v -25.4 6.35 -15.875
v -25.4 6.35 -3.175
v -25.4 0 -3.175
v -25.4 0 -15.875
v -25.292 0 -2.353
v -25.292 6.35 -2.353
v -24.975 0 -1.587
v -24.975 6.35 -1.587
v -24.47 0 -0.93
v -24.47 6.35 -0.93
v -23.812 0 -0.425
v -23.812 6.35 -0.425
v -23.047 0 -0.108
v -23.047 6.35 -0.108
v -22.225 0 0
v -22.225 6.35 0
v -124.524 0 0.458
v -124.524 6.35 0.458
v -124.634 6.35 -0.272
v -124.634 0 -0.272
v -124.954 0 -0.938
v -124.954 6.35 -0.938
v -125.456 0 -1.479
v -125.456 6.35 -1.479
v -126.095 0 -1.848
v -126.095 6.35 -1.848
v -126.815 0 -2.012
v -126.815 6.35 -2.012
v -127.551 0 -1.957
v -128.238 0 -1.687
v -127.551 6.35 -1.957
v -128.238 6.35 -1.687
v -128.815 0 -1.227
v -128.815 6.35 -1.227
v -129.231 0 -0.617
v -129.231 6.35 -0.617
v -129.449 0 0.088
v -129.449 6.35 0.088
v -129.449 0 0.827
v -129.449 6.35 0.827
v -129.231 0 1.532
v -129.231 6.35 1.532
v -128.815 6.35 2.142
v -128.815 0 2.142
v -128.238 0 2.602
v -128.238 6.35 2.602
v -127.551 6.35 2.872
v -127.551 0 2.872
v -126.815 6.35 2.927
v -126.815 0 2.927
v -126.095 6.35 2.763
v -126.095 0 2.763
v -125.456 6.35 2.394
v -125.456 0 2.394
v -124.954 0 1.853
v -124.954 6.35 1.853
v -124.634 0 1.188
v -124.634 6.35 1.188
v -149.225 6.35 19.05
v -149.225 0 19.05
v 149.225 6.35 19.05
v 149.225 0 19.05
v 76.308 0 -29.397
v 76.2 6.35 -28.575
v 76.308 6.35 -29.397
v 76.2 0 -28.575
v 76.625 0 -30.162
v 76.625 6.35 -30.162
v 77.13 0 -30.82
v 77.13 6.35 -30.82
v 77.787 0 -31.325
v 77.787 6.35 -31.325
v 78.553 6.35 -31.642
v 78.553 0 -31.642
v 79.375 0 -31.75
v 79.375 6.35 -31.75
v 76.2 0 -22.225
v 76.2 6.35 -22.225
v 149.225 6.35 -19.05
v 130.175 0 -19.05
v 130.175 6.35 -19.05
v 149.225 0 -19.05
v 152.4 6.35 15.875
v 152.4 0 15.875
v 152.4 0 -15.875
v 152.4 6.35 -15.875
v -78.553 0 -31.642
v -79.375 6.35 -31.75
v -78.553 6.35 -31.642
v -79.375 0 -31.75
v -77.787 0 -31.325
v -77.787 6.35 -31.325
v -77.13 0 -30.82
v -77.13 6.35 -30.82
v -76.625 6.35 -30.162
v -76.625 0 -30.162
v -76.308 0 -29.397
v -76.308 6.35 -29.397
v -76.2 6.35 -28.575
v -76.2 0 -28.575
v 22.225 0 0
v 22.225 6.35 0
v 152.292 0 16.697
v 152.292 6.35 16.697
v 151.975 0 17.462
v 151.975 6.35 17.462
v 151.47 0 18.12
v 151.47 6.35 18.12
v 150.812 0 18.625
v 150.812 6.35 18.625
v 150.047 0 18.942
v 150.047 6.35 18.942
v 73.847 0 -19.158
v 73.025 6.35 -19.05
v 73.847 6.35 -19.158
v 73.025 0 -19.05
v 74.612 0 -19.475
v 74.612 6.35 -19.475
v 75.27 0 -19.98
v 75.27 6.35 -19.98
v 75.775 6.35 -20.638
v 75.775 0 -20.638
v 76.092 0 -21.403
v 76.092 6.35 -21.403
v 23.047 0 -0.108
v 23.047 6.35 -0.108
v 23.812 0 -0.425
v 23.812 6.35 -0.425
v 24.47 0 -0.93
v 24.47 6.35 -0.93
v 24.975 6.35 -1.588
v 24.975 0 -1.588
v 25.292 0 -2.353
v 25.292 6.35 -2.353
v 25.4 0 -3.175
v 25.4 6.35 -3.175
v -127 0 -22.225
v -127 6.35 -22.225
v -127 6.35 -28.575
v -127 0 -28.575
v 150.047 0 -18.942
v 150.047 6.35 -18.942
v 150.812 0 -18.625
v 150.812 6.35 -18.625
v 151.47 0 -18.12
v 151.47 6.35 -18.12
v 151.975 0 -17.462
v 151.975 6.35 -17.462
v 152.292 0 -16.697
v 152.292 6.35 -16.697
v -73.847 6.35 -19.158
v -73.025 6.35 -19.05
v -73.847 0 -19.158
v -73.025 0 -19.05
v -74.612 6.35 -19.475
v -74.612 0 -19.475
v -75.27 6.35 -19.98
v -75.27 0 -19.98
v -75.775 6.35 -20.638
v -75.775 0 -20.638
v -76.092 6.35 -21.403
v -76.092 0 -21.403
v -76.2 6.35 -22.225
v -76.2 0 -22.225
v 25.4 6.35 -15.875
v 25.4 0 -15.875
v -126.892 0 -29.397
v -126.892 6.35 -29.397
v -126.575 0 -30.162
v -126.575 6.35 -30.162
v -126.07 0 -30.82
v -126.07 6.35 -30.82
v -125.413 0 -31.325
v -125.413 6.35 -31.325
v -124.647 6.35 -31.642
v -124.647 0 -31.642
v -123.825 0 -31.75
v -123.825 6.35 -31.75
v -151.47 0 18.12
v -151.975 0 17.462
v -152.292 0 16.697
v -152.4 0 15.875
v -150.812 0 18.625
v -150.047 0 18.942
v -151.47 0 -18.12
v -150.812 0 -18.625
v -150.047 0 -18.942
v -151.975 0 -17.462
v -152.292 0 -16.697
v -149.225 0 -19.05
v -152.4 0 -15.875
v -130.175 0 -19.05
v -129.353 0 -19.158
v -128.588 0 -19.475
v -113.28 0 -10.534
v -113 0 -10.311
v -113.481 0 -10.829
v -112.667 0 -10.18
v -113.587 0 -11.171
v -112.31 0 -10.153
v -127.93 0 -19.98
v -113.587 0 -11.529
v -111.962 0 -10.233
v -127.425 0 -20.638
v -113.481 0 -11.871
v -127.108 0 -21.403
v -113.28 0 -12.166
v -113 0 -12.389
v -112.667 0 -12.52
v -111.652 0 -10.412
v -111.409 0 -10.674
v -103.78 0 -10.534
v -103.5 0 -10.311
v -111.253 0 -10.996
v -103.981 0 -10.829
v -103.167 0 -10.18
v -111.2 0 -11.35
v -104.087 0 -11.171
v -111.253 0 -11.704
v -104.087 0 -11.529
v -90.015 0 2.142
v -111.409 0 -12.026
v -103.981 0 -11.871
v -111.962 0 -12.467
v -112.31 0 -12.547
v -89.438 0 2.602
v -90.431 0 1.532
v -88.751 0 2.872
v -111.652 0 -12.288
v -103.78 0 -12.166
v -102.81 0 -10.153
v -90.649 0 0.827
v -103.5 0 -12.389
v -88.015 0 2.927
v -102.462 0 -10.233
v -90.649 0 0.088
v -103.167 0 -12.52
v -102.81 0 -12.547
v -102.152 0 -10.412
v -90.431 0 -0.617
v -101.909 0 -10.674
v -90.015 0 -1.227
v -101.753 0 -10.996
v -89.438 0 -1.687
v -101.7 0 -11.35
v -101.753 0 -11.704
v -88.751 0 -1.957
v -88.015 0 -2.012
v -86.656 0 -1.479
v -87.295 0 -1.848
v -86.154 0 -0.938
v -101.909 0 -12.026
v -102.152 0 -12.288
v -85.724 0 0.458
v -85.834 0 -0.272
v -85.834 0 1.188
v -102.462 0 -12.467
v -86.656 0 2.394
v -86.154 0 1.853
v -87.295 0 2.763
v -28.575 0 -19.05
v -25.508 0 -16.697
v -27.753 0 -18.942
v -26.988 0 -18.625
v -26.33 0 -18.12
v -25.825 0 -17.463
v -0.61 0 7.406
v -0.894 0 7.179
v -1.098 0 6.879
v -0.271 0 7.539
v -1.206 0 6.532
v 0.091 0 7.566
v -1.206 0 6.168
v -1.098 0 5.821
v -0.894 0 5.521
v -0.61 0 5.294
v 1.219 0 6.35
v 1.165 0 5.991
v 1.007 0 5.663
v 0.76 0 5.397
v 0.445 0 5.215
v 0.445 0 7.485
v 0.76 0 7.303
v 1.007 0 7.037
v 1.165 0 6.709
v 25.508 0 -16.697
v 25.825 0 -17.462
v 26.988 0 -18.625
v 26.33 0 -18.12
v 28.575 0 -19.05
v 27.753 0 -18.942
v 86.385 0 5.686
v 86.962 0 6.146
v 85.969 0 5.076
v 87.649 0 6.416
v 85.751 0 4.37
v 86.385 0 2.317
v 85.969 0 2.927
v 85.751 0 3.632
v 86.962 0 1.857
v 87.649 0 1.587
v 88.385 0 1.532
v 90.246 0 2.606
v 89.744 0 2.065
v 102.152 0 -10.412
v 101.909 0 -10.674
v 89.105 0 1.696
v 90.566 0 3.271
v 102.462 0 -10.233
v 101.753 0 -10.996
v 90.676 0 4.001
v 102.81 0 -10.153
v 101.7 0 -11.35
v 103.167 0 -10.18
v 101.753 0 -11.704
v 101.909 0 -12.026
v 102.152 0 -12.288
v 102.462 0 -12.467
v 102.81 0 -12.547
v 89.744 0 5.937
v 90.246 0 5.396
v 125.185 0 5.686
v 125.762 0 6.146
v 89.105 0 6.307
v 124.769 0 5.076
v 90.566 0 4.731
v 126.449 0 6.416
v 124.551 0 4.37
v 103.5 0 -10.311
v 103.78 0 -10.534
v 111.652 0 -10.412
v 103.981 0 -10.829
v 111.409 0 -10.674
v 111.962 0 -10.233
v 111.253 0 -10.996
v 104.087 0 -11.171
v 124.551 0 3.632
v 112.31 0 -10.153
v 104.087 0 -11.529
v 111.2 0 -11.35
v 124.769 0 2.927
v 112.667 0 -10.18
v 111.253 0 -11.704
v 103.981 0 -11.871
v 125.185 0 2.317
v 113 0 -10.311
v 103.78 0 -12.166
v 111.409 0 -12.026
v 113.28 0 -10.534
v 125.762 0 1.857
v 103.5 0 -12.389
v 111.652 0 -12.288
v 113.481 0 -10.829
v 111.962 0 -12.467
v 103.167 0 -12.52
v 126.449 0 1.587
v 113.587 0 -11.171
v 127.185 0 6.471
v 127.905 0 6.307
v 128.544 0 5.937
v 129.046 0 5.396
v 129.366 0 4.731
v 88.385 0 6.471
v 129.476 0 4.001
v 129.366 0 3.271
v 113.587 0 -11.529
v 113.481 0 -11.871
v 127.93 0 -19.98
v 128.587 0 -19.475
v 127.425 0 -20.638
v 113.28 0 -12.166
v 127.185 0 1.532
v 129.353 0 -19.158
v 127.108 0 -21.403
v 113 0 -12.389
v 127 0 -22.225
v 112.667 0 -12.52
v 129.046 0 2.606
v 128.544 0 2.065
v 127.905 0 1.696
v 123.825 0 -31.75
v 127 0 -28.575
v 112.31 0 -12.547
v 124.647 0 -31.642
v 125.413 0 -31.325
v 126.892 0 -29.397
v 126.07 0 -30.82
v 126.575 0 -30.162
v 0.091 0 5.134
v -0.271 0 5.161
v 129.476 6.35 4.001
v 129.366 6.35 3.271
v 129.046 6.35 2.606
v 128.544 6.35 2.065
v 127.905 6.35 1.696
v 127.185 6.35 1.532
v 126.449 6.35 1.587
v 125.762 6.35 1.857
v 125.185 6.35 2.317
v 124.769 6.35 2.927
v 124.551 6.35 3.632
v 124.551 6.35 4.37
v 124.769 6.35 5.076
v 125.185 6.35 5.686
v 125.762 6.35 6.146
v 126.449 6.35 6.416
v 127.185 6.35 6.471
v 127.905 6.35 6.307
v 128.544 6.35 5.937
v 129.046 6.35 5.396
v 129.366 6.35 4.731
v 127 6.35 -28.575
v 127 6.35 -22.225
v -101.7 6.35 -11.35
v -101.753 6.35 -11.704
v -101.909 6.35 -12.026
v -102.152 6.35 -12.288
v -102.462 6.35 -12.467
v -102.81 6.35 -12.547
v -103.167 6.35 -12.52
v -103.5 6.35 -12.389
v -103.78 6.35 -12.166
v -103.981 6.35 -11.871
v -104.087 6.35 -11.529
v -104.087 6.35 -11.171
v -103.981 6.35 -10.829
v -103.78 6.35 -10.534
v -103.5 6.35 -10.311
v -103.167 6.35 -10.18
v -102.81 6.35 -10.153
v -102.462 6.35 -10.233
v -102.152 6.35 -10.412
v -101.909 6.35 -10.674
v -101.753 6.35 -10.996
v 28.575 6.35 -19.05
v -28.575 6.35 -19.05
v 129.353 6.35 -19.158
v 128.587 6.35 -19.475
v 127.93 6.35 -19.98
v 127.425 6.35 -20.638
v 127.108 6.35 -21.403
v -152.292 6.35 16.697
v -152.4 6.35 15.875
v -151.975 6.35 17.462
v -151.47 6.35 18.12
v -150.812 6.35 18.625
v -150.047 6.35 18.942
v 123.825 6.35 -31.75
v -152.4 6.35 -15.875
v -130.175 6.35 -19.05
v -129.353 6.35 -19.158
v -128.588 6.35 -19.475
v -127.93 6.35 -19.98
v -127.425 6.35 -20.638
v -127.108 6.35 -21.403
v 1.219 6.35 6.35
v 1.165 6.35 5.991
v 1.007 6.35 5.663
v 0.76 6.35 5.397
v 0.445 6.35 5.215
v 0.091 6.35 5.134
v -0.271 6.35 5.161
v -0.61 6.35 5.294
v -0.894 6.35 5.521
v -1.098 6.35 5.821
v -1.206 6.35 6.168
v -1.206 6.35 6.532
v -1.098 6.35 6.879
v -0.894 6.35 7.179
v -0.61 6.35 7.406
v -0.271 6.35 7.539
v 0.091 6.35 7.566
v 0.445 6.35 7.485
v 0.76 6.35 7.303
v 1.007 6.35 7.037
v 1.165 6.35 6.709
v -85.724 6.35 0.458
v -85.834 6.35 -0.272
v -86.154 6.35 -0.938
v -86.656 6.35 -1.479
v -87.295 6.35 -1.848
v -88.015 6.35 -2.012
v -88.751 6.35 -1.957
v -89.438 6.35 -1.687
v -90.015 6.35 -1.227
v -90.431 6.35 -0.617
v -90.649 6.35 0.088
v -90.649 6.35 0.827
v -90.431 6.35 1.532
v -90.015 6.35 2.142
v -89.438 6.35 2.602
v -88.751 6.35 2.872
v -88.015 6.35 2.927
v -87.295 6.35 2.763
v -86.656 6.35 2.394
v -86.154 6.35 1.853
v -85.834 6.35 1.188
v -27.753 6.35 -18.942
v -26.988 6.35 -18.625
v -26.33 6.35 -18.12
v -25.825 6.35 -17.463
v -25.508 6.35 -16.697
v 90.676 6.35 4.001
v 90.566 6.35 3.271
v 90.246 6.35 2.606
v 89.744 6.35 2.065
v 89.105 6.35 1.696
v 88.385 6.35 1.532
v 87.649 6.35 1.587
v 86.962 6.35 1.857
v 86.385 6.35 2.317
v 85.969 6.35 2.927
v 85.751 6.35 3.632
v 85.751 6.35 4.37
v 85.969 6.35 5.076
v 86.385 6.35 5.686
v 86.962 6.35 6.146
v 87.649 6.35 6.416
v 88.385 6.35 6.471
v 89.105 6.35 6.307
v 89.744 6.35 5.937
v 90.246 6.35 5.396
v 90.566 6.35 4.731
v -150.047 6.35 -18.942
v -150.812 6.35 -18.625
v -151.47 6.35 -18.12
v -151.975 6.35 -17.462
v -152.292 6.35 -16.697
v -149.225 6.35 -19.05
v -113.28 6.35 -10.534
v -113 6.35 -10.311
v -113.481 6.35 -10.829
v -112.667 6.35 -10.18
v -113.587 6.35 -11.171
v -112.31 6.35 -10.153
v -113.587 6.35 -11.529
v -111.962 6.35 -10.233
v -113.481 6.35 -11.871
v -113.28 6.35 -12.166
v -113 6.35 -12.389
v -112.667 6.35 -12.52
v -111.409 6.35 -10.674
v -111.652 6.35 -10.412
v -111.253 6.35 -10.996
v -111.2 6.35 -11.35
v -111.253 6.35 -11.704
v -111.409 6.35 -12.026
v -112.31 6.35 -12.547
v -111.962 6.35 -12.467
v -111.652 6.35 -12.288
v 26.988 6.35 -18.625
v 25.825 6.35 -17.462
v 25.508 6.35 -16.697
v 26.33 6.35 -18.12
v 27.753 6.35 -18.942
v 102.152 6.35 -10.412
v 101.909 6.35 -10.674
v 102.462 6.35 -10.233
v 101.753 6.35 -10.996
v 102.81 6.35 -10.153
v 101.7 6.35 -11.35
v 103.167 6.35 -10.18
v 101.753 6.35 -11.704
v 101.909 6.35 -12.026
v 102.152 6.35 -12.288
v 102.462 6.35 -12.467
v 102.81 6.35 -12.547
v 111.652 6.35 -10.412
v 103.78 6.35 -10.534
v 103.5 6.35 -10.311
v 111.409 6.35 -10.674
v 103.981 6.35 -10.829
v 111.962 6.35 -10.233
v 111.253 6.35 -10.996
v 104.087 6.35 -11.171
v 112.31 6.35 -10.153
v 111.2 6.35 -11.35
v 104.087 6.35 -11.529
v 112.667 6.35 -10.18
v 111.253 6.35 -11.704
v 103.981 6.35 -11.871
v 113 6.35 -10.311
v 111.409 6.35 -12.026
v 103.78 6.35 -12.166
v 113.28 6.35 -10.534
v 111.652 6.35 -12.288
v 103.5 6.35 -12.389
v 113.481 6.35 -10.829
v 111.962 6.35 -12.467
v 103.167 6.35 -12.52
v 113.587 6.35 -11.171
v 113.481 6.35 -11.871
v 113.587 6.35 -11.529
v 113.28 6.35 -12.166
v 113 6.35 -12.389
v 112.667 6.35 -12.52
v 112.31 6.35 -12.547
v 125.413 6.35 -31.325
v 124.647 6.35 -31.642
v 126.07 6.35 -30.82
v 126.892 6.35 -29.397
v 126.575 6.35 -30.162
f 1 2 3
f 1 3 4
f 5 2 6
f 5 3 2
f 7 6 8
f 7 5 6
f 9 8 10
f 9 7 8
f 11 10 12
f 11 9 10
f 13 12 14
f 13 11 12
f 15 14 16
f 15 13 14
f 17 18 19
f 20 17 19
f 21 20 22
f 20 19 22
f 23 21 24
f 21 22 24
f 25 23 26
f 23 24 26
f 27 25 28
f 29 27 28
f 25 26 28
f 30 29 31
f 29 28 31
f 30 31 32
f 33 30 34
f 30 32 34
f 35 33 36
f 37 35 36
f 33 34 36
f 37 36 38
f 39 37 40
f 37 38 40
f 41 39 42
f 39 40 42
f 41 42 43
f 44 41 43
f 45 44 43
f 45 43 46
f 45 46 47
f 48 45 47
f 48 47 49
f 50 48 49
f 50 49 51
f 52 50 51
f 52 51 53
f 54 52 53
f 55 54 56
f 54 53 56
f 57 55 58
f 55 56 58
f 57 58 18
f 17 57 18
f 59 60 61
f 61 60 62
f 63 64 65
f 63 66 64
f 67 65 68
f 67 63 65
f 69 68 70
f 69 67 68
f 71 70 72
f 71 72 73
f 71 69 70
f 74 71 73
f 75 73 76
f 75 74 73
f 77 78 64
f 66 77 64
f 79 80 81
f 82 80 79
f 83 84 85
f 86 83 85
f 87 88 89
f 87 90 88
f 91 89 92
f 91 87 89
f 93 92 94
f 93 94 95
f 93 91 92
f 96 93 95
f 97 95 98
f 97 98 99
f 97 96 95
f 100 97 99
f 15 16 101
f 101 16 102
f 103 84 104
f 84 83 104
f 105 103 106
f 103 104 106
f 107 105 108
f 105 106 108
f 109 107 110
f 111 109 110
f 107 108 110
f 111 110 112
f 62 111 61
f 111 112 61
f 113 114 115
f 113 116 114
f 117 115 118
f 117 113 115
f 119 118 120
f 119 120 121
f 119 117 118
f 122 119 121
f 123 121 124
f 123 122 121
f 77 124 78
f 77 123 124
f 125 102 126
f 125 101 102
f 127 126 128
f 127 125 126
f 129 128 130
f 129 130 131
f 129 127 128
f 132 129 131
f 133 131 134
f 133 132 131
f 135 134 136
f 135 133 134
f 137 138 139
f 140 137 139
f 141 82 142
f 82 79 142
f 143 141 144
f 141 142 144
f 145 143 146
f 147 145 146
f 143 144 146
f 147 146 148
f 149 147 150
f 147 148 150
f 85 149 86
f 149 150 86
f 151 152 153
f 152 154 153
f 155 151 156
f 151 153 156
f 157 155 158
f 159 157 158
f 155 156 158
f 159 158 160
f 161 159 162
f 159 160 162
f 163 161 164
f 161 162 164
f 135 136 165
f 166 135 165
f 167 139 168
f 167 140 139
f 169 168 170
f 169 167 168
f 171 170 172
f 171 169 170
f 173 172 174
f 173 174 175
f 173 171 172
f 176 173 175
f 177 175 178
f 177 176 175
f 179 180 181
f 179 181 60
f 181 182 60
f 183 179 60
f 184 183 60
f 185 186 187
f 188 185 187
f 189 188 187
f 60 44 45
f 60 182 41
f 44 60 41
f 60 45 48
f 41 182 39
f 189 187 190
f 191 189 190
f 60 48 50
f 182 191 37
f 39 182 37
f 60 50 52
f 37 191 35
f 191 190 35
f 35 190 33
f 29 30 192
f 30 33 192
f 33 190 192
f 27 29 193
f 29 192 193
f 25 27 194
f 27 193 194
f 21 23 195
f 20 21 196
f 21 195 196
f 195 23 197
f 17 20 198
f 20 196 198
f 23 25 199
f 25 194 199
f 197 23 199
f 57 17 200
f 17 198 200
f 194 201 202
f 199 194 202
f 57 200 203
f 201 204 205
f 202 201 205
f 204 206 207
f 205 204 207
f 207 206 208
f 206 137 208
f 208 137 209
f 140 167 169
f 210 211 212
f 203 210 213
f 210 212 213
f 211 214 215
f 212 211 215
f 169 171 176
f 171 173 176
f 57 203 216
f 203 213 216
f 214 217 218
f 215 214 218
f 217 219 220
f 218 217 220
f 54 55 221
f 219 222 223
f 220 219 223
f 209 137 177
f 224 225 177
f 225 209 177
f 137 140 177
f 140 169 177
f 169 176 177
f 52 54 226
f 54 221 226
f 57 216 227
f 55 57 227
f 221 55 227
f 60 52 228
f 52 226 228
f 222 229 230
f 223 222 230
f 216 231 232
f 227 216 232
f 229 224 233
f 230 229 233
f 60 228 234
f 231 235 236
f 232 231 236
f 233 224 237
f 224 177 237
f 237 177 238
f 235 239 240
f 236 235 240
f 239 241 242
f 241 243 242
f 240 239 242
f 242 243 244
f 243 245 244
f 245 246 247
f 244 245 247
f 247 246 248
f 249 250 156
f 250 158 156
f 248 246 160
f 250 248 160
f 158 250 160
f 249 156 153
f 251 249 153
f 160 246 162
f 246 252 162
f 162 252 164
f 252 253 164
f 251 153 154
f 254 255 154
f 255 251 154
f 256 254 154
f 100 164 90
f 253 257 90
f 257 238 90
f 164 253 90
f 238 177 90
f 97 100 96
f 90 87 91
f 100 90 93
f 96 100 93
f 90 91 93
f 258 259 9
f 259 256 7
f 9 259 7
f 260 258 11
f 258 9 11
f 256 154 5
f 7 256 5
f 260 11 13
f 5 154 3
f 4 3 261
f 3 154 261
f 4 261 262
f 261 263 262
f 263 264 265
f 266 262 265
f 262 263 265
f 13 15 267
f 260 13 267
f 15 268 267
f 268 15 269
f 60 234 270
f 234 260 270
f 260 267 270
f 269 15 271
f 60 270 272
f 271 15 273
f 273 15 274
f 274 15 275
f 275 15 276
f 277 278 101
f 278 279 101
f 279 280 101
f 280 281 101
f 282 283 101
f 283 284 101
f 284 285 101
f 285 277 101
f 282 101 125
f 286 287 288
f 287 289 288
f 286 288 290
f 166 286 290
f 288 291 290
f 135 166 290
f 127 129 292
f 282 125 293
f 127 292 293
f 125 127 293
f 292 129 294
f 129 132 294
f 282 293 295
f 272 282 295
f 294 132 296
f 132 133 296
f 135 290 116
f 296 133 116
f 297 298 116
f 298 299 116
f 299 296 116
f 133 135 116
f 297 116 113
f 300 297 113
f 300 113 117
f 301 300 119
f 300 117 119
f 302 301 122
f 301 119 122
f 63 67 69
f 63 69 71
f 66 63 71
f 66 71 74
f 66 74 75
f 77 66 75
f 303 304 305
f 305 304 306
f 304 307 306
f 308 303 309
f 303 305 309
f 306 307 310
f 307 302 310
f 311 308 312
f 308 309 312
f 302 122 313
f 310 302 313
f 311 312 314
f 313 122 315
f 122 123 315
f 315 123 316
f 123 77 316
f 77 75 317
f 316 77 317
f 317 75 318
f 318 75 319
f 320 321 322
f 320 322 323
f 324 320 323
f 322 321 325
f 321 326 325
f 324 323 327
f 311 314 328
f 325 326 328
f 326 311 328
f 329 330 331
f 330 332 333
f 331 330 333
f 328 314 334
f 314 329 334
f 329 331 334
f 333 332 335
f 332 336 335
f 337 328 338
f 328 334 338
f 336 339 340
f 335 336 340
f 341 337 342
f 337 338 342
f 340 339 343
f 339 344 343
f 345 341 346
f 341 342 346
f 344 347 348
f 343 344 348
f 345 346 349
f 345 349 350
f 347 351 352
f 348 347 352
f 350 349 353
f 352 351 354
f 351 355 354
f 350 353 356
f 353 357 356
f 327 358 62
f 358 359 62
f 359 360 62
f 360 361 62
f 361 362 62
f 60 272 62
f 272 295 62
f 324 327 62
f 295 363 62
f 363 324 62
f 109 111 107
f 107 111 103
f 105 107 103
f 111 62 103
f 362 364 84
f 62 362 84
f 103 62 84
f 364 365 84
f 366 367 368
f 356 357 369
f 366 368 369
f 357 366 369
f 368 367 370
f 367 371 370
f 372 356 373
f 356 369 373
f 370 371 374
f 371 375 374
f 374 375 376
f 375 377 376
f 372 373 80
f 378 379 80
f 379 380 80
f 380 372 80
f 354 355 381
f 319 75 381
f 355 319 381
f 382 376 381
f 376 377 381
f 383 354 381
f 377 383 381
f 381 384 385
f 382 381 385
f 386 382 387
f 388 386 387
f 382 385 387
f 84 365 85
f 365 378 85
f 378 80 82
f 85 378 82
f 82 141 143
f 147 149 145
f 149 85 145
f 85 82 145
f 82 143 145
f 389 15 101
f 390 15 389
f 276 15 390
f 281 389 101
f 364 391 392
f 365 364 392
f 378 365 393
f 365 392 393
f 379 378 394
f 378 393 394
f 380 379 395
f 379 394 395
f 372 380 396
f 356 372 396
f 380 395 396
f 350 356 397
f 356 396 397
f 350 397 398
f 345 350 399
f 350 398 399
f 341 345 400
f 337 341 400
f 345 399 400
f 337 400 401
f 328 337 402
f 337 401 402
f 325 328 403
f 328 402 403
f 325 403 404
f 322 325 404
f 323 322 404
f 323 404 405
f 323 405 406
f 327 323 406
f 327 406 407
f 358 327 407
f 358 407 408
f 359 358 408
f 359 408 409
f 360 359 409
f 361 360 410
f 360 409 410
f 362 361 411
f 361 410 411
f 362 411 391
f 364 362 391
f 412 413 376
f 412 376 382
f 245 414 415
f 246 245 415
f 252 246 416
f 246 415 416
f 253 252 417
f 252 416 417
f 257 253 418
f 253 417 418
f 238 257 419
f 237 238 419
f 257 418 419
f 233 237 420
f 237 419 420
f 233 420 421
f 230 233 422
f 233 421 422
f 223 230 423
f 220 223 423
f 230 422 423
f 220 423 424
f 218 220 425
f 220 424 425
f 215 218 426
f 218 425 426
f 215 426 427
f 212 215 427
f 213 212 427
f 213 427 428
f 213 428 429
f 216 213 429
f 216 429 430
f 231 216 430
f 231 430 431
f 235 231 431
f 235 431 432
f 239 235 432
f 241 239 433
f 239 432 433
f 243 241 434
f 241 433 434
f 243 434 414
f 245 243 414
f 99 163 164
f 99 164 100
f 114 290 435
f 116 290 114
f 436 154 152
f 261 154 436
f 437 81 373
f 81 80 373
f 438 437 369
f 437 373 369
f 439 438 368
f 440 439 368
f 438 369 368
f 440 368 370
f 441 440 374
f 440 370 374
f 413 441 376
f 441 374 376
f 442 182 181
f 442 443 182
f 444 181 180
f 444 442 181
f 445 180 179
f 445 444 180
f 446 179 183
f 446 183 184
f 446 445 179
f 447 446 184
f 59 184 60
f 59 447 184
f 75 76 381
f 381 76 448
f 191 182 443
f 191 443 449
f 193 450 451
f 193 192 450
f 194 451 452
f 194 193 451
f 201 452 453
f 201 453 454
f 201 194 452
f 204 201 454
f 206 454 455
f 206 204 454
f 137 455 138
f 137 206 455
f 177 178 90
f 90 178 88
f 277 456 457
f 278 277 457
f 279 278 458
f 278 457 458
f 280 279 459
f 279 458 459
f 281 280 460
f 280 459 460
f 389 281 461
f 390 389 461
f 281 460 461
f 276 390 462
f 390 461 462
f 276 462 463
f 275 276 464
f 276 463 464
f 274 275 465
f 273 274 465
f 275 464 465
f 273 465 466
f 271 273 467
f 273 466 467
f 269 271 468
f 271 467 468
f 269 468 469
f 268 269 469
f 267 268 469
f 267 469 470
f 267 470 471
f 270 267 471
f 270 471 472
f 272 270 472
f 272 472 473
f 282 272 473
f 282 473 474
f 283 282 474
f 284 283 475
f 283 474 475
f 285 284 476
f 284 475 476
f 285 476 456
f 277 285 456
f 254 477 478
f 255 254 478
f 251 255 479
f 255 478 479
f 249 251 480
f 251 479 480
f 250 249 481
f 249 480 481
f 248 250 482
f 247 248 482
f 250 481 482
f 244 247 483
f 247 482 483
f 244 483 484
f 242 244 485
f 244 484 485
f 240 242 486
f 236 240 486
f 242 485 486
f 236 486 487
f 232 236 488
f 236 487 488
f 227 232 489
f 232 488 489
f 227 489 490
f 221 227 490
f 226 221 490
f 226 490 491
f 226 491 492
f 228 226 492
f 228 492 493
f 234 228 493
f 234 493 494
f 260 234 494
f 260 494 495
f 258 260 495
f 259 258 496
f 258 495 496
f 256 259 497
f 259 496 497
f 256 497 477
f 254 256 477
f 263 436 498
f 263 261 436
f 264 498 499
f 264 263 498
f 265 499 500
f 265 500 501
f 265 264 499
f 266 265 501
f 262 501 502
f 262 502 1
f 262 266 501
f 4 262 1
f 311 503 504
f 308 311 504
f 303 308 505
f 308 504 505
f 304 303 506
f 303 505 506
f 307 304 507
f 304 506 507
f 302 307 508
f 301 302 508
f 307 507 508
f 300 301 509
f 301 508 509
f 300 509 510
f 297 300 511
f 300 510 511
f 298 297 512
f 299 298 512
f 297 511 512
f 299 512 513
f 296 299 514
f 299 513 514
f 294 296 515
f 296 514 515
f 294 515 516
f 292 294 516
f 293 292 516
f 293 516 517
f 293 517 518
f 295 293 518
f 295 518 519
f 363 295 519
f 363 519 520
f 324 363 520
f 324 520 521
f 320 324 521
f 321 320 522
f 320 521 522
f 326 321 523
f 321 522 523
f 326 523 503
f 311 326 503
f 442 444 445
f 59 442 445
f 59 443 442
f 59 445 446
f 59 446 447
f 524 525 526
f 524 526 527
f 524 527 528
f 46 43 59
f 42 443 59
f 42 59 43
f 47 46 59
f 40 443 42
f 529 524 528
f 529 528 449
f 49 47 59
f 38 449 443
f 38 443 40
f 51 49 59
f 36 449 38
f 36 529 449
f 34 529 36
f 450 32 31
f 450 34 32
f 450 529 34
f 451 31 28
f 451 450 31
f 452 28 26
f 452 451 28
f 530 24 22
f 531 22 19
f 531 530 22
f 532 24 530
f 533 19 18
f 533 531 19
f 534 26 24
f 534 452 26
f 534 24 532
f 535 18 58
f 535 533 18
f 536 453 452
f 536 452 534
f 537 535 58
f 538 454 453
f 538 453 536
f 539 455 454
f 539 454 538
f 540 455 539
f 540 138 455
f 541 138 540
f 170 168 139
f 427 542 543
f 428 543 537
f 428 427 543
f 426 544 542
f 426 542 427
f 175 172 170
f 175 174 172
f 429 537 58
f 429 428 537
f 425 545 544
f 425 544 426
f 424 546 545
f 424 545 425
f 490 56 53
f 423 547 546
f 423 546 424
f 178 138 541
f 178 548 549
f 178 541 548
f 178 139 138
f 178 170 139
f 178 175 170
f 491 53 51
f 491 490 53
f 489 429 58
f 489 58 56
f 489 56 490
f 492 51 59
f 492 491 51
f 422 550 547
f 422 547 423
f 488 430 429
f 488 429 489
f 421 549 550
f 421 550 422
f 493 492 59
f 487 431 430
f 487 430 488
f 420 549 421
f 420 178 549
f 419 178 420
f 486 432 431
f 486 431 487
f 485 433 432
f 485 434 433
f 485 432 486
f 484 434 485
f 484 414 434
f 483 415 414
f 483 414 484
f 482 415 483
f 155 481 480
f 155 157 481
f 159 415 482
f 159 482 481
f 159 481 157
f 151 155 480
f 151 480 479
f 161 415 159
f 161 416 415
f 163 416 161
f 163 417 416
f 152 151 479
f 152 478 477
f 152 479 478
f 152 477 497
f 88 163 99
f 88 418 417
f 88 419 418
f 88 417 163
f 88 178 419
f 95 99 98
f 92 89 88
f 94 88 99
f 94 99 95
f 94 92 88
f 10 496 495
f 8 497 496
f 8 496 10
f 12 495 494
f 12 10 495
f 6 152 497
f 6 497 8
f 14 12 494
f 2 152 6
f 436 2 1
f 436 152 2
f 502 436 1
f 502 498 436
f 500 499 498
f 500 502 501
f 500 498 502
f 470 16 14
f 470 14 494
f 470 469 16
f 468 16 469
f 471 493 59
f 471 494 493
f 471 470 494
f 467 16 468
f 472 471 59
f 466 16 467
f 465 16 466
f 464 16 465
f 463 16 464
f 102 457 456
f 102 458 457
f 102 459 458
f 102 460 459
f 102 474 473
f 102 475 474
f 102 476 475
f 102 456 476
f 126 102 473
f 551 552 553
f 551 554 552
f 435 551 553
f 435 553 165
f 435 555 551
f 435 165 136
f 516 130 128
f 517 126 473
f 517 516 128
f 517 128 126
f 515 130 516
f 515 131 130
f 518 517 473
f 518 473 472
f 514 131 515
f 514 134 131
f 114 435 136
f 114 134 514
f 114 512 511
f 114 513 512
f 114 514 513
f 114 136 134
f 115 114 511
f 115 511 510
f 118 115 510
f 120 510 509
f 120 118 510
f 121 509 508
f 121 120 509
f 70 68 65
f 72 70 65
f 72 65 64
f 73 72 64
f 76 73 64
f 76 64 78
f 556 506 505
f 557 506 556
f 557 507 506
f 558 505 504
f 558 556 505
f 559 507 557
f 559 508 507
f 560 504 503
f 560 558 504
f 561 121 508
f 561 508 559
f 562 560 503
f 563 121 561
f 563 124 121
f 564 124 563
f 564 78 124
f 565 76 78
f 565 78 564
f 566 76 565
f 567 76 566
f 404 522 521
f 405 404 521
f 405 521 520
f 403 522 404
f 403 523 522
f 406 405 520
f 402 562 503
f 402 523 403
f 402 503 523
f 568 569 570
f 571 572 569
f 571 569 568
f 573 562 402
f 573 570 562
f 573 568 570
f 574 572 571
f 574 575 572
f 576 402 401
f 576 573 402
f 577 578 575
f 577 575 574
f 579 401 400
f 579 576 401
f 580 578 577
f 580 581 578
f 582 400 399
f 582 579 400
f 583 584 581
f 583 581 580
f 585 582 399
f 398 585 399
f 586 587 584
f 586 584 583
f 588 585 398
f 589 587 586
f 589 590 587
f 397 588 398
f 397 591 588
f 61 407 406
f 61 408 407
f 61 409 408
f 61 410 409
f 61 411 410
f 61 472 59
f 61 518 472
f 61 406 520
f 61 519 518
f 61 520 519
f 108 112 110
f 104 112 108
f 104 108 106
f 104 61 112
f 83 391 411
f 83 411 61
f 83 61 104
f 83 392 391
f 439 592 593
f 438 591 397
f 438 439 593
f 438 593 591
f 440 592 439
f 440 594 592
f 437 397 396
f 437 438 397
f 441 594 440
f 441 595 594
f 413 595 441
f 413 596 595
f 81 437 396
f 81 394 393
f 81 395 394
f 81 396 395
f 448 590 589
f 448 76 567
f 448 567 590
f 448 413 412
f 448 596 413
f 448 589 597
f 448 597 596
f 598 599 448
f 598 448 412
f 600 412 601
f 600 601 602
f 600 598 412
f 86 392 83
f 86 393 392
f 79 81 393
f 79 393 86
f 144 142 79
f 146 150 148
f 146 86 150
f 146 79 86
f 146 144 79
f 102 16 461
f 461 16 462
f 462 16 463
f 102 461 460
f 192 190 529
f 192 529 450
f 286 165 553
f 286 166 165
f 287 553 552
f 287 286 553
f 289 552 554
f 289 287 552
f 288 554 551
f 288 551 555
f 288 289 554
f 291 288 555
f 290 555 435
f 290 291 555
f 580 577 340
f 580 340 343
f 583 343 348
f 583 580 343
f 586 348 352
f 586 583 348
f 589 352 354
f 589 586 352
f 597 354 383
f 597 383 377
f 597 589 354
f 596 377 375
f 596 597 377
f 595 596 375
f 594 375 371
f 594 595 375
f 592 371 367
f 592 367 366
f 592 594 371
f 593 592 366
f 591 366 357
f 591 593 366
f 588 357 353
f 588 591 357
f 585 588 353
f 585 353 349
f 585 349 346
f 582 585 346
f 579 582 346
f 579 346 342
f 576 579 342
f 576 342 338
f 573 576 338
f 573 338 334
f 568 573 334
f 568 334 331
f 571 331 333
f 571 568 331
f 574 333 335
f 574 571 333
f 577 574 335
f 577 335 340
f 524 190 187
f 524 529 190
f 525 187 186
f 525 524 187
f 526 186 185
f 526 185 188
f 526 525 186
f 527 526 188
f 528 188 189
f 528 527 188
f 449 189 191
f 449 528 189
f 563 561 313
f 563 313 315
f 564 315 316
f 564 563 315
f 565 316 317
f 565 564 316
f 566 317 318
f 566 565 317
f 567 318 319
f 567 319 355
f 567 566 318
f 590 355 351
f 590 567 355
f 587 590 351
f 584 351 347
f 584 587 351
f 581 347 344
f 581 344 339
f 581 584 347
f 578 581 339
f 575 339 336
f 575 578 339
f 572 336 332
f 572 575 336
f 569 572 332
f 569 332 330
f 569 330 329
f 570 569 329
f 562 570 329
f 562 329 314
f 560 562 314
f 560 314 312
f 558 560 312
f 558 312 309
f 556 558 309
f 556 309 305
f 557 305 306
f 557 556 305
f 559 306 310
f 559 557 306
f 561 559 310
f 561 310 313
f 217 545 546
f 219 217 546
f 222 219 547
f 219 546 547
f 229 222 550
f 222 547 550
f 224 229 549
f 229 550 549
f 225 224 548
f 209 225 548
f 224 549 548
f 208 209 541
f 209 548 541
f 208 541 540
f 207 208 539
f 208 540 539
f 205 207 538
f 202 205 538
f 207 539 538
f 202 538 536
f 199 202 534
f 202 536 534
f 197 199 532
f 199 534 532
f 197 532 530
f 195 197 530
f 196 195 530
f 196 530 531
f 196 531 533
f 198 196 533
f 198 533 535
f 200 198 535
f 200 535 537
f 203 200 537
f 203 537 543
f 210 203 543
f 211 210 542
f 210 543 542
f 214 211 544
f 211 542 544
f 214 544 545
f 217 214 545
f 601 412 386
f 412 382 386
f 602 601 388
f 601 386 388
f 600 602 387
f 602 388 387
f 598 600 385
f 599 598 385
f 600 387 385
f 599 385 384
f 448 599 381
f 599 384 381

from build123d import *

# Parameters (mm, degrees)
SKETCH1_W           = 304.8
SKETCH1_H           = 38.1
BOSS_EXTRUDE1_DEPTH = 6.35
SKETCH5_W           = 50.8
SKETCH5_H           = 12.7
BOSS_EXTRUDE2_DEPTH = 6.35
FILLET1_R           = 3.175
FILLET2_R           = 3.175
SKETCH2_R           = 1.4732
CUT_EXTRUDE1_DEPTH  = 6.35
SKETCH3_R           = 1.2
CUT_EXTRUDE2_DEPTH  = 6.35
SKETCH4_R           = 2.4765
CUT_EXTRUDE3_DEPTH  = 6.35
SKETCH6_W           = 50.8
SKETCH6_H           = 19.05
CUT_EXTRUDE4_DEPTH  = 6.35
FILLET3_R           = 3.175
SKETCH7_R           = 1.2192
CUT_EXTRUDE5_DEPTH  = 6.35


with BuildPart() as part:
    # Sketch1 → Boss-Extrude1 (new body)
    with BuildSketch(Plane(origin=(0, 0, 0), x_dir=(1, 0, 0), z_dir=(0, 1, 0))):
        Rectangle(SKETCH1_W, SKETCH1_H)
    extrude(amount=BOSS_EXTRUDE1_DEPTH)

    # Sketch5 → Boss-Extrude2 (add)
    with BuildSketch(Plane(origin=(0, 6.35, 0), x_dir=(1, 0, 0), z_dir=(0, 1, 0))):
        with Locations((-101.6, 25.4)):
            Rectangle(SKETCH5_W, SKETCH5_H)
        with Locations((101.6, 25.4)):
            Rectangle(SKETCH5_W, SKETCH5_H)
    extrude(amount=-BOSS_EXTRUDE2_DEPTH)

    # Fillet1
    fillet1_edges = [part.edges().sort_by_distance(p)[0] for p in [
        (127, 3.175, -19.05),
        (127, 3.175, -31.75),
        (76.2, 3.175, -31.75),
        (76.2, 3.175, -19.05),
        (-76.2, 3.175, -19.05),
        (-76.2, 3.175, -31.75),
        (-127, 3.175, -31.75),
        (-127, 3.175, -19.05),
    ]]
    fillet(fillet1_edges, radius=FILLET1_R)

    # Fillet2
    fillet2_edges = [part.edges().sort_by_distance(p)[0] for p in [
        (152.4, 3.175, -19.05),
        (152.4, 3.175, 19.05),
        (-152.4, 3.175, 19.05),
        (-152.4, 3.175, -19.05),
    ]]
    fillet(fillet2_edges, radius=FILLET2_R)

    # Sketch2 → Cut-Extrude1 (cut)
    with BuildSketch(Plane(origin=(0, 6.35, 0), x_dir=(1, 0, 0), z_dir=(0, 1, 0))):
        with Locations((0, 12.7)):
            Circle(SKETCH2_R)
    extrude(amount=-CUT_EXTRUDE1_DEPTH, mode=Mode.SUBTRACT)

    # Sketch3 → Cut-Extrude2 (cut)
    with BuildSketch(Plane(origin=(0, 6.35, 0), x_dir=(1, 0, 0), z_dir=(0, 1, 0))):
        with Locations((-112.4, 11.35)):
            Circle(SKETCH3_R)
        with Locations((-102.9, 11.35)):
            Circle(SKETCH3_R)
    cut_extrude2 = extrude(amount=-CUT_EXTRUDE2_DEPTH, mode=Mode.SUBTRACT)

    # Mirror1: Cut-Extrude2 across plane
    add(cut_extrude2.mirror(Plane(origin=(0, 0, 0), x_dir=(0, 0, 1), z_dir=(1, 0, 0))), mode=Mode.SUBTRACT)

    # Sketch4 → Cut-Extrude3 (cut)
    with BuildSketch(Plane(origin=(0, 6.35, 0), x_dir=(1, 0, 0), z_dir=(0, 1, 0))):
        with Locations((-127, -0.457547173)):
            Circle(SKETCH4_R)
        with Locations((-88.2, -0.457547173)):
            Circle(SKETCH4_R)
        with Locations((88.2, -4.001229652)):
            Circle(SKETCH4_R)
        with Locations((127, -4.001229652)):
            Circle(SKETCH4_R)
    extrude(amount=-CUT_EXTRUDE3_DEPTH, mode=Mode.SUBTRACT)

    # Sketch6 → Cut-Extrude4 (cut)
    with BuildSketch(Plane(origin=(0, 6.35, 0), x_dir=(1, 0, 0), z_dir=(0, 1, 0))):
        with Locations((0, 9.525)):
            Rectangle(SKETCH6_W, SKETCH6_H)
    extrude(amount=-CUT_EXTRUDE4_DEPTH, mode=Mode.SUBTRACT)

    # Fillet3
    fillet3_edges = [part.edges().sort_by_distance(p)[0] for p in [
        (25.4, 3.175, -19.05),
        (25.4, 3.175, 0),
        (-25.4, 3.175, 0),
        (-25.4, 3.175, -19.05),
    ]]
    fillet(fillet3_edges, radius=FILLET3_R)

    # Sketch7 → Cut-Extrude5 (cut)
    with BuildSketch(Plane(origin=(0, 6.35, 0), x_dir=(1, 0, 0), z_dir=(0, 1, 0))):
        with Locations((0, -6.35)):
            Circle(SKETCH7_R)
    extrude(amount=-CUT_EXTRUDE5_DEPTH, mode=Mode.SUBTRACT)


solid = part.part
